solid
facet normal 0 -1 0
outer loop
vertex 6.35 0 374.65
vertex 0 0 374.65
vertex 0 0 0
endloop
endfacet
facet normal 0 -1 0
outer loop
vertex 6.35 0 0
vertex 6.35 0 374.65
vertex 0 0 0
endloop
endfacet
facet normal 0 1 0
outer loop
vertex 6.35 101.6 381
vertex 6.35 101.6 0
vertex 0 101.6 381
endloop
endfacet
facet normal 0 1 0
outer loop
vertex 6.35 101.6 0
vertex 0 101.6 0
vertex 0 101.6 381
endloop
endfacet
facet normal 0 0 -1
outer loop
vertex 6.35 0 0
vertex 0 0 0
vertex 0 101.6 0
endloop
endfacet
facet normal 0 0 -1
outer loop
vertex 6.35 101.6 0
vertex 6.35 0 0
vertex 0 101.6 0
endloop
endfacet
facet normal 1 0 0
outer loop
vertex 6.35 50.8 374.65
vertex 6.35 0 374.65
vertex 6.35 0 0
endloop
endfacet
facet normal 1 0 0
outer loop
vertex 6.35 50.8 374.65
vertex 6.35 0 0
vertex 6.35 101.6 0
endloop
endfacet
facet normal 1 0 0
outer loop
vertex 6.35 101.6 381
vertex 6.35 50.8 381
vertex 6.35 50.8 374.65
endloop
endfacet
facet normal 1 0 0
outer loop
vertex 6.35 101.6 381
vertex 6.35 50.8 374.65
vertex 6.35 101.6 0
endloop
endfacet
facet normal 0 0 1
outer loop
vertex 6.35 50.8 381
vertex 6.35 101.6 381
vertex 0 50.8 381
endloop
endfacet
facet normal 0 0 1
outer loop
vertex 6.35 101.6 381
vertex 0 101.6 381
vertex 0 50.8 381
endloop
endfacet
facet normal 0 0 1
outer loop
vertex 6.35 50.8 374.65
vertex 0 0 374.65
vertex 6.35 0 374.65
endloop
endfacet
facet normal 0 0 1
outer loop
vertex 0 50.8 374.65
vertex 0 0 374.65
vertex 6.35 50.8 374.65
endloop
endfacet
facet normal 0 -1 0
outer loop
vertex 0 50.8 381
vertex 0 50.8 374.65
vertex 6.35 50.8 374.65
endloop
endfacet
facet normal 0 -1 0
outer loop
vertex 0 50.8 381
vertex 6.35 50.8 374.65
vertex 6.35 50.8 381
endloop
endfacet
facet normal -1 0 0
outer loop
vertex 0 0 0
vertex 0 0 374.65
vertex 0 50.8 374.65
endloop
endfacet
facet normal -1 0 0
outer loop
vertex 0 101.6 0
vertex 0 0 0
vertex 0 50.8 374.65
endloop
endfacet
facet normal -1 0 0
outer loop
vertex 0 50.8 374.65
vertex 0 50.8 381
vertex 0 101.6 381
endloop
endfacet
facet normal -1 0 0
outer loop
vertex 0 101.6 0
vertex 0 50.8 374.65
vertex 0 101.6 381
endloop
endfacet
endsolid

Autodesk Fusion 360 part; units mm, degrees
sketch "Sketch1" plane through (0, 0, 0) normal (1, 0, 0) x (0, 1, 0)
  line L0 (0, 0) -> (101.6, 0)
  line L1 (101.6, 0) -> (101.6, 381)
  line L2 (101.6, 381) -> (0, 381)
  line L3 (0, 381) -> (0, 0)
  line L4 (50.8, 381) -> (0, 381)
  line L5 (0, 381) -> (0, 374.65)
  line L6 (0, 374.65) -> (50.8, 374.65)
  line L7 (50.8, 374.65) -> (50.8, 381)
  dimension "d1" = 101.6
  dimension "d2" = 381
  dimension "d3" = 6.35
  dimension "d5" = 50.8
extrude "Extrude1" add sketch "Sketch1" along normal blind 6.35 contours L0 L1 L2 L3 L6 L7
